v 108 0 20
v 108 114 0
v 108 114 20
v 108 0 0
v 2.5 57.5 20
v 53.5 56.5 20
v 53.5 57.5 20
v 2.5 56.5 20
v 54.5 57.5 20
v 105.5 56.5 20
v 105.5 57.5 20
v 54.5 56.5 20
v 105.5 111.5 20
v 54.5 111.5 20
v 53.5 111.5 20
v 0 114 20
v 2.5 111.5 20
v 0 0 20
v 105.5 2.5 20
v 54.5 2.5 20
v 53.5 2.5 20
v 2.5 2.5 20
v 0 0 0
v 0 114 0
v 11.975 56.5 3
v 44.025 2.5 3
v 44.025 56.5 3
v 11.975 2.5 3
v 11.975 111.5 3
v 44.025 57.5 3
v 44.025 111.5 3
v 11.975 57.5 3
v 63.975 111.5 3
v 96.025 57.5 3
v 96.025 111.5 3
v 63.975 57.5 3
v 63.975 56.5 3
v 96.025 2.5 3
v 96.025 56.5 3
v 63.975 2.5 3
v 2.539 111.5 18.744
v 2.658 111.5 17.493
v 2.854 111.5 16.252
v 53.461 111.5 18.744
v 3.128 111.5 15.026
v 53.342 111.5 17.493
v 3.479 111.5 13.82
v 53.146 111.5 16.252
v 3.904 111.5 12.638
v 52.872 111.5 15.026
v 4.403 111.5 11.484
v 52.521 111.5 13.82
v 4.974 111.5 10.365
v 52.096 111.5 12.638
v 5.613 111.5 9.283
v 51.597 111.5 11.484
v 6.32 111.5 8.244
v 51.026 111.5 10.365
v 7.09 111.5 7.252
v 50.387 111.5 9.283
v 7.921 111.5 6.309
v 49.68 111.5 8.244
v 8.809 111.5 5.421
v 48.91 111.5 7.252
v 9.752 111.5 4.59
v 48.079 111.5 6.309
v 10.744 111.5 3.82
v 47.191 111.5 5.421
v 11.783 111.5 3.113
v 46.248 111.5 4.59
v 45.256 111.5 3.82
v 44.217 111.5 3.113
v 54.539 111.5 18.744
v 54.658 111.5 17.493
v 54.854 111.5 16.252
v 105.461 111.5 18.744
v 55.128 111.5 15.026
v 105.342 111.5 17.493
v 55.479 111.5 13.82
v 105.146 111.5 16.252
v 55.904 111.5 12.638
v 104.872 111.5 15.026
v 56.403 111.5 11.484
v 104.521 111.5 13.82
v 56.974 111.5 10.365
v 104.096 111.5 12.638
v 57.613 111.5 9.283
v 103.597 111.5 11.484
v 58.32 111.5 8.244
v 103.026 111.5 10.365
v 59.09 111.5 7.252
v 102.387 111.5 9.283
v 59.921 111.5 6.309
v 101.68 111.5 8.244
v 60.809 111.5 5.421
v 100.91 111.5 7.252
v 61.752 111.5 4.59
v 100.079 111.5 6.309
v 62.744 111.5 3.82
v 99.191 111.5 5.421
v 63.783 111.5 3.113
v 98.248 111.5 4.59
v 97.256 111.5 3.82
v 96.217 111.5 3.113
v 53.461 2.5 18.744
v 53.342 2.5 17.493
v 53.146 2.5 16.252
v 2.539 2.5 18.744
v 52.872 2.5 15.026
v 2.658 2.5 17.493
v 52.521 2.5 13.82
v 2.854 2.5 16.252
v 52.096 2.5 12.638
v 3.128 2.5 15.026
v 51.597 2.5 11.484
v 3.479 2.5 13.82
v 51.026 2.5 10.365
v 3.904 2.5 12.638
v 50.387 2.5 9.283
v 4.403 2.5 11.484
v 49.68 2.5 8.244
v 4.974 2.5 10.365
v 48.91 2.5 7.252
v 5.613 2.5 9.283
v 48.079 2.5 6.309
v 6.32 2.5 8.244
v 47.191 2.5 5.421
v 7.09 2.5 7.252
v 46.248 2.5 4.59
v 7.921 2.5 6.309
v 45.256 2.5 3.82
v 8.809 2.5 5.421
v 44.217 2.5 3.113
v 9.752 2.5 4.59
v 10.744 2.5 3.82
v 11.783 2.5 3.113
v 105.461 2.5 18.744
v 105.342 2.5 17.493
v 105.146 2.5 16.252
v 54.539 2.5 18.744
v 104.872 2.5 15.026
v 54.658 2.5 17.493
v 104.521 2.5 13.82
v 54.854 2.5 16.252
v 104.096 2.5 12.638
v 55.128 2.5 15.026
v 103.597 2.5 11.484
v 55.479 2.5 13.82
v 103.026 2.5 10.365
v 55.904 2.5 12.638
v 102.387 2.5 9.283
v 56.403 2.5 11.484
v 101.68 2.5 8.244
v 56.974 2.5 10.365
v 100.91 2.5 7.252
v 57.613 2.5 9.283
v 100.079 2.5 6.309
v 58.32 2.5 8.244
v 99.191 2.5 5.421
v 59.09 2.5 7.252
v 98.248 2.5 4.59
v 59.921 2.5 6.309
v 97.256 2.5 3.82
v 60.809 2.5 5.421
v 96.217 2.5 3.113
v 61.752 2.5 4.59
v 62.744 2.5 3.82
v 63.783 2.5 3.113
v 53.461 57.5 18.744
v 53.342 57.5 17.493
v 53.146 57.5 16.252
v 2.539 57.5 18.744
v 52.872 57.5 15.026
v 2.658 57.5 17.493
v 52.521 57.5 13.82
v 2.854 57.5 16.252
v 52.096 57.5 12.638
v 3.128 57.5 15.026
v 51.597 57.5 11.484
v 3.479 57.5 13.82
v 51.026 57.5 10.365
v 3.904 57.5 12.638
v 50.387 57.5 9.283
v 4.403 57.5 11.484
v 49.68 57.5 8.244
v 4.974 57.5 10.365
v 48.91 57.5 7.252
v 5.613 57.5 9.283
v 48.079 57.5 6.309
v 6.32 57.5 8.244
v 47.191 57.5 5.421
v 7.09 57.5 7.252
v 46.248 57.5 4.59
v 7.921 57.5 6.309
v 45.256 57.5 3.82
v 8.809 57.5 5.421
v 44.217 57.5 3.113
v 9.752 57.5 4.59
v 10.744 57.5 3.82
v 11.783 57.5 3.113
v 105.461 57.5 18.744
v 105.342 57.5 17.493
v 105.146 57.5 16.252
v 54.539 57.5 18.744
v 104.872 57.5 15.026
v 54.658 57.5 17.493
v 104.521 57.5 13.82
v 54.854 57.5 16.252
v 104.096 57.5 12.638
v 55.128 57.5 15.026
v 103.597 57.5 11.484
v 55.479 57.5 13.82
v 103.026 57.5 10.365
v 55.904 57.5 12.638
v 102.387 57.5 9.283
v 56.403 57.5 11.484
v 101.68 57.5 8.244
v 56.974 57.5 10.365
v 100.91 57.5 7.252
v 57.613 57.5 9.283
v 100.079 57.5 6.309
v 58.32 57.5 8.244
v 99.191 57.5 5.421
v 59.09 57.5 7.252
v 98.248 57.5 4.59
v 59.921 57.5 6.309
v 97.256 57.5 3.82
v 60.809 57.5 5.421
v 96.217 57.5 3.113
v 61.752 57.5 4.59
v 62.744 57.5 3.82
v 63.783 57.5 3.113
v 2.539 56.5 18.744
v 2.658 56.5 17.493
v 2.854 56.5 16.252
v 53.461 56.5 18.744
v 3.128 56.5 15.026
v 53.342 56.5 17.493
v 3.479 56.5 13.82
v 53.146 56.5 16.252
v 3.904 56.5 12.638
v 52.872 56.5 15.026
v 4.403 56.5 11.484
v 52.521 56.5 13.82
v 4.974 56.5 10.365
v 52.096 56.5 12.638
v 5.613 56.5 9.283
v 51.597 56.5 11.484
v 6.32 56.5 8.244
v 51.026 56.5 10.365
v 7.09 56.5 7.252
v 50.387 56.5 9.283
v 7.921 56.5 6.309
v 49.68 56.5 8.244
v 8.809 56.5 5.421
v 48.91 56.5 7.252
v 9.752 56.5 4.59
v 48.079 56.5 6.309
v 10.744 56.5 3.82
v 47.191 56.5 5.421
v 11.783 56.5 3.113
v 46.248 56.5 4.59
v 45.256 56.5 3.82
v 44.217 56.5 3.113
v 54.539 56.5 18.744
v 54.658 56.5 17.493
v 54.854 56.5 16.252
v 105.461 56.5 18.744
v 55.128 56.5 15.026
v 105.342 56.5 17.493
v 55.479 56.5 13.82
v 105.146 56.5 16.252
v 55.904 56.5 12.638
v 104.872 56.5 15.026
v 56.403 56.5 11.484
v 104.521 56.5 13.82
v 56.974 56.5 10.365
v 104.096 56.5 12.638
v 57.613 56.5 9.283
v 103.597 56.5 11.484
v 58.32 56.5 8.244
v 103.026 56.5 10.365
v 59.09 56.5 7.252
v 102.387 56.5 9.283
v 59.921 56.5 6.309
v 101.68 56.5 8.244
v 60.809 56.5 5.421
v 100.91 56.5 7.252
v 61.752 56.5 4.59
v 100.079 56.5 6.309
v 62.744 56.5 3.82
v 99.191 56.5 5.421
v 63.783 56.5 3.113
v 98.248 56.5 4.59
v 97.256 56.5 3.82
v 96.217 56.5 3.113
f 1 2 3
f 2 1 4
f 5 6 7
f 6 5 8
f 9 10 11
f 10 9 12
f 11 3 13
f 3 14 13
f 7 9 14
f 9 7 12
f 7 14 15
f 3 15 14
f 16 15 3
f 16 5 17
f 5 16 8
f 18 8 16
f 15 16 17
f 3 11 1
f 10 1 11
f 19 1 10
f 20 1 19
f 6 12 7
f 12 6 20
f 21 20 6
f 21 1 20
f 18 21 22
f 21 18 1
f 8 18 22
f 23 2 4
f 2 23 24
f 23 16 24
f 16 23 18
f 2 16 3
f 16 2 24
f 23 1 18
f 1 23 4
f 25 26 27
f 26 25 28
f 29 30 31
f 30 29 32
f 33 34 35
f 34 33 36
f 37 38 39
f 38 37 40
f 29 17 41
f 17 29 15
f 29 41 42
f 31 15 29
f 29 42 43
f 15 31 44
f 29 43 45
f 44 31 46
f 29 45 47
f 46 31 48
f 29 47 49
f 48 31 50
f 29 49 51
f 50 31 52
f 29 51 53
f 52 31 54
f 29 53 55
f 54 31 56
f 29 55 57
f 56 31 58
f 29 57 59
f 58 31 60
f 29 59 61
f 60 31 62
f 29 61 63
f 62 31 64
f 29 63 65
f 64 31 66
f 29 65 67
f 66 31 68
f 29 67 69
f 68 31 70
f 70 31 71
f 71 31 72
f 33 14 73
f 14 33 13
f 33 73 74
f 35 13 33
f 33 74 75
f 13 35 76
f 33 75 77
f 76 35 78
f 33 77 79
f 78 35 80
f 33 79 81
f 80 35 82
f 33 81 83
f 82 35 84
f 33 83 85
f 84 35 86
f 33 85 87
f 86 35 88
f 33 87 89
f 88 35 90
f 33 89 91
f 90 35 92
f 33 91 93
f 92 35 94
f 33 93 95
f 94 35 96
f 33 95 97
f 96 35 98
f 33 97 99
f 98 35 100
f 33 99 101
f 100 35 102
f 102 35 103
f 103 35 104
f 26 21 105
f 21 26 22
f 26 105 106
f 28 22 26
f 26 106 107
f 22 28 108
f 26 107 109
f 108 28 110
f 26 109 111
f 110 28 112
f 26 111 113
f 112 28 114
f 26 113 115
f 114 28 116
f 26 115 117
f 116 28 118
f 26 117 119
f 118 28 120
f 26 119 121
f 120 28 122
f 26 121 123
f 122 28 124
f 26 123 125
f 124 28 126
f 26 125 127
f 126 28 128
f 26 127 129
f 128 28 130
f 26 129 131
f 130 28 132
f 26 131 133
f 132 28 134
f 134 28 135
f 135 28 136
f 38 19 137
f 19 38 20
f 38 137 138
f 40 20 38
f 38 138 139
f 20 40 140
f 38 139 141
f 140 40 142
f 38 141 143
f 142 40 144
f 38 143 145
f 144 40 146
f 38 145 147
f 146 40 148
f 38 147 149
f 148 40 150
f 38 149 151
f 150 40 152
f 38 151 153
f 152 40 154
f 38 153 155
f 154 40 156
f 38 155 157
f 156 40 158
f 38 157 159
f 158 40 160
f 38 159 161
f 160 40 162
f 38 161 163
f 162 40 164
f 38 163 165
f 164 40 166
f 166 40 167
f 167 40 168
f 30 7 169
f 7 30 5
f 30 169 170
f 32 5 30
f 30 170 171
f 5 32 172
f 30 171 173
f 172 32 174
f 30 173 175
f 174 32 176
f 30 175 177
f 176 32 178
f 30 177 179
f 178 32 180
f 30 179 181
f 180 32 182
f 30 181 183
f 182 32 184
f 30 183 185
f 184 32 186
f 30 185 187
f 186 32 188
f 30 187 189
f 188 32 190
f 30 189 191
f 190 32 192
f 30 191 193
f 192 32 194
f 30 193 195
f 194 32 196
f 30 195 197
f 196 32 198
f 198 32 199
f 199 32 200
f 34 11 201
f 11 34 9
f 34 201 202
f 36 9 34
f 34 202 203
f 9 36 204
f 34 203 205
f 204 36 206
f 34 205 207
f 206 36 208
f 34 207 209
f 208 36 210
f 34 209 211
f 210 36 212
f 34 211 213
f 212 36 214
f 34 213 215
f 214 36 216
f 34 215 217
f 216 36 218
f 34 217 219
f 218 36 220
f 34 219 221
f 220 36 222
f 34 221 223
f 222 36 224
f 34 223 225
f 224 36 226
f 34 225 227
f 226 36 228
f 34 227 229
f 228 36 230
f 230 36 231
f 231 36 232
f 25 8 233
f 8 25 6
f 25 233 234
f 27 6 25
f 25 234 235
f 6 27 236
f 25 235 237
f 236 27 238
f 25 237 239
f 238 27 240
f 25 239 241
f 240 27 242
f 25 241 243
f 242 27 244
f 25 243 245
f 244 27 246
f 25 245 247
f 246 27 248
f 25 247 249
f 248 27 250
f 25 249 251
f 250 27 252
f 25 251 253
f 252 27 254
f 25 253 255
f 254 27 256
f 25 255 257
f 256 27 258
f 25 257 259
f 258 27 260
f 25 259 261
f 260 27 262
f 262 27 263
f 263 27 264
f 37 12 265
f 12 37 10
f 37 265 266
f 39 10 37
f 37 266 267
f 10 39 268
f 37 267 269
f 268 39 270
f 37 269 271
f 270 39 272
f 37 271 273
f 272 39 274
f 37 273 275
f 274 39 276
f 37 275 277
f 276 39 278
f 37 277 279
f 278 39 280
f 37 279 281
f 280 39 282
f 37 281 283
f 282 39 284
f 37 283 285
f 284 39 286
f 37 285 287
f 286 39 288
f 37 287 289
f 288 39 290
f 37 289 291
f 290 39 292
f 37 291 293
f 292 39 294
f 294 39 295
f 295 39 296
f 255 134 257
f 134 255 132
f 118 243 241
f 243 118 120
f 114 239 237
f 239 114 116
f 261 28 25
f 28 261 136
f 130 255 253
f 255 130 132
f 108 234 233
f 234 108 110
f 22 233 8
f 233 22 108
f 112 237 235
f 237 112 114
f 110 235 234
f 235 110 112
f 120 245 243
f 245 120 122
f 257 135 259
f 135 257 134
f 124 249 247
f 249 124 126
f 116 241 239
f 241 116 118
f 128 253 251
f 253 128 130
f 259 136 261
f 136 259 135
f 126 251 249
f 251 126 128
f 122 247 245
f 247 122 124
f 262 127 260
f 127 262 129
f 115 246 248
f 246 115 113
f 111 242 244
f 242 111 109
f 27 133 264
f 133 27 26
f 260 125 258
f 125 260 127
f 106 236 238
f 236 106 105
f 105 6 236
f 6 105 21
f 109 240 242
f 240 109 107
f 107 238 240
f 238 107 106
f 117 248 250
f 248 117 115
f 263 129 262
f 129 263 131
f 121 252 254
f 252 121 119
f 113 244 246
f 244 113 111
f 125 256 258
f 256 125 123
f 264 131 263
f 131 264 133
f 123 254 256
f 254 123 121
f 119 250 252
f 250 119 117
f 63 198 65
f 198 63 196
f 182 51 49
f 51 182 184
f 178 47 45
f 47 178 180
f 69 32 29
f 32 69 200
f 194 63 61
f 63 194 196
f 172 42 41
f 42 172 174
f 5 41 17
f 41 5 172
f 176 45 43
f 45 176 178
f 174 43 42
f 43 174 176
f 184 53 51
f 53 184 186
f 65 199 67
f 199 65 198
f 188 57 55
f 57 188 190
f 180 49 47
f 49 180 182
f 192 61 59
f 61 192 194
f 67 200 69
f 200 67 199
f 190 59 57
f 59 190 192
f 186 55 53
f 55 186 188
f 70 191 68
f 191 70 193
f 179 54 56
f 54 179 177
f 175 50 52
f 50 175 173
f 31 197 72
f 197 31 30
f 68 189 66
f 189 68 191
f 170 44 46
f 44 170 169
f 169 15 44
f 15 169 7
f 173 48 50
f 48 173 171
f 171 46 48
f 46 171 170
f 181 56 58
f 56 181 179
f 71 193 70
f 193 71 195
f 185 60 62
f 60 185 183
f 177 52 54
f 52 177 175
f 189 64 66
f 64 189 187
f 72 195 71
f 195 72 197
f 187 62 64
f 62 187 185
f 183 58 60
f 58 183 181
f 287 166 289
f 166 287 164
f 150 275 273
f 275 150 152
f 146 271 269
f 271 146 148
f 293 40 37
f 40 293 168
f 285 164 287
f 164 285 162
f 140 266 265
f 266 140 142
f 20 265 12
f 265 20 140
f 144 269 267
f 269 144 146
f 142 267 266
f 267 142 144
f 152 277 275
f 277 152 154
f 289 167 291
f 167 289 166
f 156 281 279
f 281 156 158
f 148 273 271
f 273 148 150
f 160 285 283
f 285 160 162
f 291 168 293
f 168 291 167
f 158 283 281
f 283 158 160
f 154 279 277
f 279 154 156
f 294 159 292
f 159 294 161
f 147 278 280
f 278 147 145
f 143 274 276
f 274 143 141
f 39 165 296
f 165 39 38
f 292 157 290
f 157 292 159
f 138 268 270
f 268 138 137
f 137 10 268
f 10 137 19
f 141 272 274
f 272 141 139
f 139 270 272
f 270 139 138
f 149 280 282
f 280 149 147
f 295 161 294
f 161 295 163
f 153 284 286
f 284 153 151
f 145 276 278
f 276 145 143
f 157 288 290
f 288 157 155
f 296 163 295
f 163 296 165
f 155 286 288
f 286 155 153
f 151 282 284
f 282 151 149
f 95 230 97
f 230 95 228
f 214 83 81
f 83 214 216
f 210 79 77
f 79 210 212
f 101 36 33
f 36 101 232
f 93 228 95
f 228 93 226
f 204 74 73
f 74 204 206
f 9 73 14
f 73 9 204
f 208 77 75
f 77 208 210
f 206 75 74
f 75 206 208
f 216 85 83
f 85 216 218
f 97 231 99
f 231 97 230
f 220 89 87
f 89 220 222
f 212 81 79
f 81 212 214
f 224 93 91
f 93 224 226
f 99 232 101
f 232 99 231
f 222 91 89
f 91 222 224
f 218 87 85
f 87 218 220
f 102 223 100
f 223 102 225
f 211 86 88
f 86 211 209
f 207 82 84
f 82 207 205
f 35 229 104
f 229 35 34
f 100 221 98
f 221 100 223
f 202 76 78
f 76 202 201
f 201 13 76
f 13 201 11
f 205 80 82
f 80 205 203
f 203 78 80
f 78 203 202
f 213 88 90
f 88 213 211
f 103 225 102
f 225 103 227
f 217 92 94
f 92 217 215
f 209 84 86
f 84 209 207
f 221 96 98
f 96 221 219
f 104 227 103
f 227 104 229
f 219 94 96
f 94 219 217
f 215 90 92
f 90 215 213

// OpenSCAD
include <../../The-Boardgame-Insert-Toolkit.v2.45/boardgame_insert_toolkit_lib.2.scad>;

coin_diametre = 25;

insert_height = 23;
insert_width = 108;
insert_depth = 114;

box_height = insert_height - 3;
box_width = (insert_width);
box_depth = insert_depth;

scout_tile_xy = 22.7;
scout_tile_thickness = 1.95;
scout_tile_compartment_depth = scout_tile_thickness * 8;

// determines whether lids are output.
g_b_print_lid = false;

// determines whether boxes are output.
g_b_print_box = true; 

// Focus on one box
g_isolated_print_box = ""; 

// Used to visualize how all of the boxes fit together. 
g_b_visualization = false;          
        
// this is the outer wall thickness.
//Default = 1.5mm
g_wall_thickness = 3;

// The tolerance value is extra space put between planes of the lid and box that fit together.
// Increase the tolerance to loosen the fit and decrease it to tighten it.
//
// Note that the tolerance is applied exclusively to the lid.
// So if the lid is too tight or too loose, change this value ( up for looser fit, down for tighter fit ) and 
// you only need to reprint the lid.
// 
// The exception is the stackable box, where the bottom of the box is the lid of the box below,
// in which case the tolerance also affects that box bottom.
//
g_tolerance = 0.15;

// This adjusts the position of the lid detents downward. 
// The larger the value, the bigger the gap between the lid and the box.
g_tolerance_detents_pos = 0.1;


data =
[
	[   "simple box",
		[
			[ BOX_SIZE_XYZ, [box_width, box_depth, box_height] ],
			[ BOX_STACKABLE_B, f ],
			[ BOX_NO_LID_B, true ],
			
			[ BOX_COMPONENT,
				[ // Dice + starting player marker
					[ CMP_COMPARTMENT_SIZE_XYZ,  [ box_width/2-g_wall_thickness,box_depth/2-g_wall_thickness,20 ] ],
					[ CMP_NUM_COMPARTMENTS_XY, [2, 2]],
					//[ POSITION_XY, [-1,scout_tile_xy*2+g_wall_thickness*2]],
					[ CMP_SHAPE, FILLET ],
					[ CMP_FILLET_RADIUS, 20 ],
				]
			],
		]
	],
];


MakeAll();
